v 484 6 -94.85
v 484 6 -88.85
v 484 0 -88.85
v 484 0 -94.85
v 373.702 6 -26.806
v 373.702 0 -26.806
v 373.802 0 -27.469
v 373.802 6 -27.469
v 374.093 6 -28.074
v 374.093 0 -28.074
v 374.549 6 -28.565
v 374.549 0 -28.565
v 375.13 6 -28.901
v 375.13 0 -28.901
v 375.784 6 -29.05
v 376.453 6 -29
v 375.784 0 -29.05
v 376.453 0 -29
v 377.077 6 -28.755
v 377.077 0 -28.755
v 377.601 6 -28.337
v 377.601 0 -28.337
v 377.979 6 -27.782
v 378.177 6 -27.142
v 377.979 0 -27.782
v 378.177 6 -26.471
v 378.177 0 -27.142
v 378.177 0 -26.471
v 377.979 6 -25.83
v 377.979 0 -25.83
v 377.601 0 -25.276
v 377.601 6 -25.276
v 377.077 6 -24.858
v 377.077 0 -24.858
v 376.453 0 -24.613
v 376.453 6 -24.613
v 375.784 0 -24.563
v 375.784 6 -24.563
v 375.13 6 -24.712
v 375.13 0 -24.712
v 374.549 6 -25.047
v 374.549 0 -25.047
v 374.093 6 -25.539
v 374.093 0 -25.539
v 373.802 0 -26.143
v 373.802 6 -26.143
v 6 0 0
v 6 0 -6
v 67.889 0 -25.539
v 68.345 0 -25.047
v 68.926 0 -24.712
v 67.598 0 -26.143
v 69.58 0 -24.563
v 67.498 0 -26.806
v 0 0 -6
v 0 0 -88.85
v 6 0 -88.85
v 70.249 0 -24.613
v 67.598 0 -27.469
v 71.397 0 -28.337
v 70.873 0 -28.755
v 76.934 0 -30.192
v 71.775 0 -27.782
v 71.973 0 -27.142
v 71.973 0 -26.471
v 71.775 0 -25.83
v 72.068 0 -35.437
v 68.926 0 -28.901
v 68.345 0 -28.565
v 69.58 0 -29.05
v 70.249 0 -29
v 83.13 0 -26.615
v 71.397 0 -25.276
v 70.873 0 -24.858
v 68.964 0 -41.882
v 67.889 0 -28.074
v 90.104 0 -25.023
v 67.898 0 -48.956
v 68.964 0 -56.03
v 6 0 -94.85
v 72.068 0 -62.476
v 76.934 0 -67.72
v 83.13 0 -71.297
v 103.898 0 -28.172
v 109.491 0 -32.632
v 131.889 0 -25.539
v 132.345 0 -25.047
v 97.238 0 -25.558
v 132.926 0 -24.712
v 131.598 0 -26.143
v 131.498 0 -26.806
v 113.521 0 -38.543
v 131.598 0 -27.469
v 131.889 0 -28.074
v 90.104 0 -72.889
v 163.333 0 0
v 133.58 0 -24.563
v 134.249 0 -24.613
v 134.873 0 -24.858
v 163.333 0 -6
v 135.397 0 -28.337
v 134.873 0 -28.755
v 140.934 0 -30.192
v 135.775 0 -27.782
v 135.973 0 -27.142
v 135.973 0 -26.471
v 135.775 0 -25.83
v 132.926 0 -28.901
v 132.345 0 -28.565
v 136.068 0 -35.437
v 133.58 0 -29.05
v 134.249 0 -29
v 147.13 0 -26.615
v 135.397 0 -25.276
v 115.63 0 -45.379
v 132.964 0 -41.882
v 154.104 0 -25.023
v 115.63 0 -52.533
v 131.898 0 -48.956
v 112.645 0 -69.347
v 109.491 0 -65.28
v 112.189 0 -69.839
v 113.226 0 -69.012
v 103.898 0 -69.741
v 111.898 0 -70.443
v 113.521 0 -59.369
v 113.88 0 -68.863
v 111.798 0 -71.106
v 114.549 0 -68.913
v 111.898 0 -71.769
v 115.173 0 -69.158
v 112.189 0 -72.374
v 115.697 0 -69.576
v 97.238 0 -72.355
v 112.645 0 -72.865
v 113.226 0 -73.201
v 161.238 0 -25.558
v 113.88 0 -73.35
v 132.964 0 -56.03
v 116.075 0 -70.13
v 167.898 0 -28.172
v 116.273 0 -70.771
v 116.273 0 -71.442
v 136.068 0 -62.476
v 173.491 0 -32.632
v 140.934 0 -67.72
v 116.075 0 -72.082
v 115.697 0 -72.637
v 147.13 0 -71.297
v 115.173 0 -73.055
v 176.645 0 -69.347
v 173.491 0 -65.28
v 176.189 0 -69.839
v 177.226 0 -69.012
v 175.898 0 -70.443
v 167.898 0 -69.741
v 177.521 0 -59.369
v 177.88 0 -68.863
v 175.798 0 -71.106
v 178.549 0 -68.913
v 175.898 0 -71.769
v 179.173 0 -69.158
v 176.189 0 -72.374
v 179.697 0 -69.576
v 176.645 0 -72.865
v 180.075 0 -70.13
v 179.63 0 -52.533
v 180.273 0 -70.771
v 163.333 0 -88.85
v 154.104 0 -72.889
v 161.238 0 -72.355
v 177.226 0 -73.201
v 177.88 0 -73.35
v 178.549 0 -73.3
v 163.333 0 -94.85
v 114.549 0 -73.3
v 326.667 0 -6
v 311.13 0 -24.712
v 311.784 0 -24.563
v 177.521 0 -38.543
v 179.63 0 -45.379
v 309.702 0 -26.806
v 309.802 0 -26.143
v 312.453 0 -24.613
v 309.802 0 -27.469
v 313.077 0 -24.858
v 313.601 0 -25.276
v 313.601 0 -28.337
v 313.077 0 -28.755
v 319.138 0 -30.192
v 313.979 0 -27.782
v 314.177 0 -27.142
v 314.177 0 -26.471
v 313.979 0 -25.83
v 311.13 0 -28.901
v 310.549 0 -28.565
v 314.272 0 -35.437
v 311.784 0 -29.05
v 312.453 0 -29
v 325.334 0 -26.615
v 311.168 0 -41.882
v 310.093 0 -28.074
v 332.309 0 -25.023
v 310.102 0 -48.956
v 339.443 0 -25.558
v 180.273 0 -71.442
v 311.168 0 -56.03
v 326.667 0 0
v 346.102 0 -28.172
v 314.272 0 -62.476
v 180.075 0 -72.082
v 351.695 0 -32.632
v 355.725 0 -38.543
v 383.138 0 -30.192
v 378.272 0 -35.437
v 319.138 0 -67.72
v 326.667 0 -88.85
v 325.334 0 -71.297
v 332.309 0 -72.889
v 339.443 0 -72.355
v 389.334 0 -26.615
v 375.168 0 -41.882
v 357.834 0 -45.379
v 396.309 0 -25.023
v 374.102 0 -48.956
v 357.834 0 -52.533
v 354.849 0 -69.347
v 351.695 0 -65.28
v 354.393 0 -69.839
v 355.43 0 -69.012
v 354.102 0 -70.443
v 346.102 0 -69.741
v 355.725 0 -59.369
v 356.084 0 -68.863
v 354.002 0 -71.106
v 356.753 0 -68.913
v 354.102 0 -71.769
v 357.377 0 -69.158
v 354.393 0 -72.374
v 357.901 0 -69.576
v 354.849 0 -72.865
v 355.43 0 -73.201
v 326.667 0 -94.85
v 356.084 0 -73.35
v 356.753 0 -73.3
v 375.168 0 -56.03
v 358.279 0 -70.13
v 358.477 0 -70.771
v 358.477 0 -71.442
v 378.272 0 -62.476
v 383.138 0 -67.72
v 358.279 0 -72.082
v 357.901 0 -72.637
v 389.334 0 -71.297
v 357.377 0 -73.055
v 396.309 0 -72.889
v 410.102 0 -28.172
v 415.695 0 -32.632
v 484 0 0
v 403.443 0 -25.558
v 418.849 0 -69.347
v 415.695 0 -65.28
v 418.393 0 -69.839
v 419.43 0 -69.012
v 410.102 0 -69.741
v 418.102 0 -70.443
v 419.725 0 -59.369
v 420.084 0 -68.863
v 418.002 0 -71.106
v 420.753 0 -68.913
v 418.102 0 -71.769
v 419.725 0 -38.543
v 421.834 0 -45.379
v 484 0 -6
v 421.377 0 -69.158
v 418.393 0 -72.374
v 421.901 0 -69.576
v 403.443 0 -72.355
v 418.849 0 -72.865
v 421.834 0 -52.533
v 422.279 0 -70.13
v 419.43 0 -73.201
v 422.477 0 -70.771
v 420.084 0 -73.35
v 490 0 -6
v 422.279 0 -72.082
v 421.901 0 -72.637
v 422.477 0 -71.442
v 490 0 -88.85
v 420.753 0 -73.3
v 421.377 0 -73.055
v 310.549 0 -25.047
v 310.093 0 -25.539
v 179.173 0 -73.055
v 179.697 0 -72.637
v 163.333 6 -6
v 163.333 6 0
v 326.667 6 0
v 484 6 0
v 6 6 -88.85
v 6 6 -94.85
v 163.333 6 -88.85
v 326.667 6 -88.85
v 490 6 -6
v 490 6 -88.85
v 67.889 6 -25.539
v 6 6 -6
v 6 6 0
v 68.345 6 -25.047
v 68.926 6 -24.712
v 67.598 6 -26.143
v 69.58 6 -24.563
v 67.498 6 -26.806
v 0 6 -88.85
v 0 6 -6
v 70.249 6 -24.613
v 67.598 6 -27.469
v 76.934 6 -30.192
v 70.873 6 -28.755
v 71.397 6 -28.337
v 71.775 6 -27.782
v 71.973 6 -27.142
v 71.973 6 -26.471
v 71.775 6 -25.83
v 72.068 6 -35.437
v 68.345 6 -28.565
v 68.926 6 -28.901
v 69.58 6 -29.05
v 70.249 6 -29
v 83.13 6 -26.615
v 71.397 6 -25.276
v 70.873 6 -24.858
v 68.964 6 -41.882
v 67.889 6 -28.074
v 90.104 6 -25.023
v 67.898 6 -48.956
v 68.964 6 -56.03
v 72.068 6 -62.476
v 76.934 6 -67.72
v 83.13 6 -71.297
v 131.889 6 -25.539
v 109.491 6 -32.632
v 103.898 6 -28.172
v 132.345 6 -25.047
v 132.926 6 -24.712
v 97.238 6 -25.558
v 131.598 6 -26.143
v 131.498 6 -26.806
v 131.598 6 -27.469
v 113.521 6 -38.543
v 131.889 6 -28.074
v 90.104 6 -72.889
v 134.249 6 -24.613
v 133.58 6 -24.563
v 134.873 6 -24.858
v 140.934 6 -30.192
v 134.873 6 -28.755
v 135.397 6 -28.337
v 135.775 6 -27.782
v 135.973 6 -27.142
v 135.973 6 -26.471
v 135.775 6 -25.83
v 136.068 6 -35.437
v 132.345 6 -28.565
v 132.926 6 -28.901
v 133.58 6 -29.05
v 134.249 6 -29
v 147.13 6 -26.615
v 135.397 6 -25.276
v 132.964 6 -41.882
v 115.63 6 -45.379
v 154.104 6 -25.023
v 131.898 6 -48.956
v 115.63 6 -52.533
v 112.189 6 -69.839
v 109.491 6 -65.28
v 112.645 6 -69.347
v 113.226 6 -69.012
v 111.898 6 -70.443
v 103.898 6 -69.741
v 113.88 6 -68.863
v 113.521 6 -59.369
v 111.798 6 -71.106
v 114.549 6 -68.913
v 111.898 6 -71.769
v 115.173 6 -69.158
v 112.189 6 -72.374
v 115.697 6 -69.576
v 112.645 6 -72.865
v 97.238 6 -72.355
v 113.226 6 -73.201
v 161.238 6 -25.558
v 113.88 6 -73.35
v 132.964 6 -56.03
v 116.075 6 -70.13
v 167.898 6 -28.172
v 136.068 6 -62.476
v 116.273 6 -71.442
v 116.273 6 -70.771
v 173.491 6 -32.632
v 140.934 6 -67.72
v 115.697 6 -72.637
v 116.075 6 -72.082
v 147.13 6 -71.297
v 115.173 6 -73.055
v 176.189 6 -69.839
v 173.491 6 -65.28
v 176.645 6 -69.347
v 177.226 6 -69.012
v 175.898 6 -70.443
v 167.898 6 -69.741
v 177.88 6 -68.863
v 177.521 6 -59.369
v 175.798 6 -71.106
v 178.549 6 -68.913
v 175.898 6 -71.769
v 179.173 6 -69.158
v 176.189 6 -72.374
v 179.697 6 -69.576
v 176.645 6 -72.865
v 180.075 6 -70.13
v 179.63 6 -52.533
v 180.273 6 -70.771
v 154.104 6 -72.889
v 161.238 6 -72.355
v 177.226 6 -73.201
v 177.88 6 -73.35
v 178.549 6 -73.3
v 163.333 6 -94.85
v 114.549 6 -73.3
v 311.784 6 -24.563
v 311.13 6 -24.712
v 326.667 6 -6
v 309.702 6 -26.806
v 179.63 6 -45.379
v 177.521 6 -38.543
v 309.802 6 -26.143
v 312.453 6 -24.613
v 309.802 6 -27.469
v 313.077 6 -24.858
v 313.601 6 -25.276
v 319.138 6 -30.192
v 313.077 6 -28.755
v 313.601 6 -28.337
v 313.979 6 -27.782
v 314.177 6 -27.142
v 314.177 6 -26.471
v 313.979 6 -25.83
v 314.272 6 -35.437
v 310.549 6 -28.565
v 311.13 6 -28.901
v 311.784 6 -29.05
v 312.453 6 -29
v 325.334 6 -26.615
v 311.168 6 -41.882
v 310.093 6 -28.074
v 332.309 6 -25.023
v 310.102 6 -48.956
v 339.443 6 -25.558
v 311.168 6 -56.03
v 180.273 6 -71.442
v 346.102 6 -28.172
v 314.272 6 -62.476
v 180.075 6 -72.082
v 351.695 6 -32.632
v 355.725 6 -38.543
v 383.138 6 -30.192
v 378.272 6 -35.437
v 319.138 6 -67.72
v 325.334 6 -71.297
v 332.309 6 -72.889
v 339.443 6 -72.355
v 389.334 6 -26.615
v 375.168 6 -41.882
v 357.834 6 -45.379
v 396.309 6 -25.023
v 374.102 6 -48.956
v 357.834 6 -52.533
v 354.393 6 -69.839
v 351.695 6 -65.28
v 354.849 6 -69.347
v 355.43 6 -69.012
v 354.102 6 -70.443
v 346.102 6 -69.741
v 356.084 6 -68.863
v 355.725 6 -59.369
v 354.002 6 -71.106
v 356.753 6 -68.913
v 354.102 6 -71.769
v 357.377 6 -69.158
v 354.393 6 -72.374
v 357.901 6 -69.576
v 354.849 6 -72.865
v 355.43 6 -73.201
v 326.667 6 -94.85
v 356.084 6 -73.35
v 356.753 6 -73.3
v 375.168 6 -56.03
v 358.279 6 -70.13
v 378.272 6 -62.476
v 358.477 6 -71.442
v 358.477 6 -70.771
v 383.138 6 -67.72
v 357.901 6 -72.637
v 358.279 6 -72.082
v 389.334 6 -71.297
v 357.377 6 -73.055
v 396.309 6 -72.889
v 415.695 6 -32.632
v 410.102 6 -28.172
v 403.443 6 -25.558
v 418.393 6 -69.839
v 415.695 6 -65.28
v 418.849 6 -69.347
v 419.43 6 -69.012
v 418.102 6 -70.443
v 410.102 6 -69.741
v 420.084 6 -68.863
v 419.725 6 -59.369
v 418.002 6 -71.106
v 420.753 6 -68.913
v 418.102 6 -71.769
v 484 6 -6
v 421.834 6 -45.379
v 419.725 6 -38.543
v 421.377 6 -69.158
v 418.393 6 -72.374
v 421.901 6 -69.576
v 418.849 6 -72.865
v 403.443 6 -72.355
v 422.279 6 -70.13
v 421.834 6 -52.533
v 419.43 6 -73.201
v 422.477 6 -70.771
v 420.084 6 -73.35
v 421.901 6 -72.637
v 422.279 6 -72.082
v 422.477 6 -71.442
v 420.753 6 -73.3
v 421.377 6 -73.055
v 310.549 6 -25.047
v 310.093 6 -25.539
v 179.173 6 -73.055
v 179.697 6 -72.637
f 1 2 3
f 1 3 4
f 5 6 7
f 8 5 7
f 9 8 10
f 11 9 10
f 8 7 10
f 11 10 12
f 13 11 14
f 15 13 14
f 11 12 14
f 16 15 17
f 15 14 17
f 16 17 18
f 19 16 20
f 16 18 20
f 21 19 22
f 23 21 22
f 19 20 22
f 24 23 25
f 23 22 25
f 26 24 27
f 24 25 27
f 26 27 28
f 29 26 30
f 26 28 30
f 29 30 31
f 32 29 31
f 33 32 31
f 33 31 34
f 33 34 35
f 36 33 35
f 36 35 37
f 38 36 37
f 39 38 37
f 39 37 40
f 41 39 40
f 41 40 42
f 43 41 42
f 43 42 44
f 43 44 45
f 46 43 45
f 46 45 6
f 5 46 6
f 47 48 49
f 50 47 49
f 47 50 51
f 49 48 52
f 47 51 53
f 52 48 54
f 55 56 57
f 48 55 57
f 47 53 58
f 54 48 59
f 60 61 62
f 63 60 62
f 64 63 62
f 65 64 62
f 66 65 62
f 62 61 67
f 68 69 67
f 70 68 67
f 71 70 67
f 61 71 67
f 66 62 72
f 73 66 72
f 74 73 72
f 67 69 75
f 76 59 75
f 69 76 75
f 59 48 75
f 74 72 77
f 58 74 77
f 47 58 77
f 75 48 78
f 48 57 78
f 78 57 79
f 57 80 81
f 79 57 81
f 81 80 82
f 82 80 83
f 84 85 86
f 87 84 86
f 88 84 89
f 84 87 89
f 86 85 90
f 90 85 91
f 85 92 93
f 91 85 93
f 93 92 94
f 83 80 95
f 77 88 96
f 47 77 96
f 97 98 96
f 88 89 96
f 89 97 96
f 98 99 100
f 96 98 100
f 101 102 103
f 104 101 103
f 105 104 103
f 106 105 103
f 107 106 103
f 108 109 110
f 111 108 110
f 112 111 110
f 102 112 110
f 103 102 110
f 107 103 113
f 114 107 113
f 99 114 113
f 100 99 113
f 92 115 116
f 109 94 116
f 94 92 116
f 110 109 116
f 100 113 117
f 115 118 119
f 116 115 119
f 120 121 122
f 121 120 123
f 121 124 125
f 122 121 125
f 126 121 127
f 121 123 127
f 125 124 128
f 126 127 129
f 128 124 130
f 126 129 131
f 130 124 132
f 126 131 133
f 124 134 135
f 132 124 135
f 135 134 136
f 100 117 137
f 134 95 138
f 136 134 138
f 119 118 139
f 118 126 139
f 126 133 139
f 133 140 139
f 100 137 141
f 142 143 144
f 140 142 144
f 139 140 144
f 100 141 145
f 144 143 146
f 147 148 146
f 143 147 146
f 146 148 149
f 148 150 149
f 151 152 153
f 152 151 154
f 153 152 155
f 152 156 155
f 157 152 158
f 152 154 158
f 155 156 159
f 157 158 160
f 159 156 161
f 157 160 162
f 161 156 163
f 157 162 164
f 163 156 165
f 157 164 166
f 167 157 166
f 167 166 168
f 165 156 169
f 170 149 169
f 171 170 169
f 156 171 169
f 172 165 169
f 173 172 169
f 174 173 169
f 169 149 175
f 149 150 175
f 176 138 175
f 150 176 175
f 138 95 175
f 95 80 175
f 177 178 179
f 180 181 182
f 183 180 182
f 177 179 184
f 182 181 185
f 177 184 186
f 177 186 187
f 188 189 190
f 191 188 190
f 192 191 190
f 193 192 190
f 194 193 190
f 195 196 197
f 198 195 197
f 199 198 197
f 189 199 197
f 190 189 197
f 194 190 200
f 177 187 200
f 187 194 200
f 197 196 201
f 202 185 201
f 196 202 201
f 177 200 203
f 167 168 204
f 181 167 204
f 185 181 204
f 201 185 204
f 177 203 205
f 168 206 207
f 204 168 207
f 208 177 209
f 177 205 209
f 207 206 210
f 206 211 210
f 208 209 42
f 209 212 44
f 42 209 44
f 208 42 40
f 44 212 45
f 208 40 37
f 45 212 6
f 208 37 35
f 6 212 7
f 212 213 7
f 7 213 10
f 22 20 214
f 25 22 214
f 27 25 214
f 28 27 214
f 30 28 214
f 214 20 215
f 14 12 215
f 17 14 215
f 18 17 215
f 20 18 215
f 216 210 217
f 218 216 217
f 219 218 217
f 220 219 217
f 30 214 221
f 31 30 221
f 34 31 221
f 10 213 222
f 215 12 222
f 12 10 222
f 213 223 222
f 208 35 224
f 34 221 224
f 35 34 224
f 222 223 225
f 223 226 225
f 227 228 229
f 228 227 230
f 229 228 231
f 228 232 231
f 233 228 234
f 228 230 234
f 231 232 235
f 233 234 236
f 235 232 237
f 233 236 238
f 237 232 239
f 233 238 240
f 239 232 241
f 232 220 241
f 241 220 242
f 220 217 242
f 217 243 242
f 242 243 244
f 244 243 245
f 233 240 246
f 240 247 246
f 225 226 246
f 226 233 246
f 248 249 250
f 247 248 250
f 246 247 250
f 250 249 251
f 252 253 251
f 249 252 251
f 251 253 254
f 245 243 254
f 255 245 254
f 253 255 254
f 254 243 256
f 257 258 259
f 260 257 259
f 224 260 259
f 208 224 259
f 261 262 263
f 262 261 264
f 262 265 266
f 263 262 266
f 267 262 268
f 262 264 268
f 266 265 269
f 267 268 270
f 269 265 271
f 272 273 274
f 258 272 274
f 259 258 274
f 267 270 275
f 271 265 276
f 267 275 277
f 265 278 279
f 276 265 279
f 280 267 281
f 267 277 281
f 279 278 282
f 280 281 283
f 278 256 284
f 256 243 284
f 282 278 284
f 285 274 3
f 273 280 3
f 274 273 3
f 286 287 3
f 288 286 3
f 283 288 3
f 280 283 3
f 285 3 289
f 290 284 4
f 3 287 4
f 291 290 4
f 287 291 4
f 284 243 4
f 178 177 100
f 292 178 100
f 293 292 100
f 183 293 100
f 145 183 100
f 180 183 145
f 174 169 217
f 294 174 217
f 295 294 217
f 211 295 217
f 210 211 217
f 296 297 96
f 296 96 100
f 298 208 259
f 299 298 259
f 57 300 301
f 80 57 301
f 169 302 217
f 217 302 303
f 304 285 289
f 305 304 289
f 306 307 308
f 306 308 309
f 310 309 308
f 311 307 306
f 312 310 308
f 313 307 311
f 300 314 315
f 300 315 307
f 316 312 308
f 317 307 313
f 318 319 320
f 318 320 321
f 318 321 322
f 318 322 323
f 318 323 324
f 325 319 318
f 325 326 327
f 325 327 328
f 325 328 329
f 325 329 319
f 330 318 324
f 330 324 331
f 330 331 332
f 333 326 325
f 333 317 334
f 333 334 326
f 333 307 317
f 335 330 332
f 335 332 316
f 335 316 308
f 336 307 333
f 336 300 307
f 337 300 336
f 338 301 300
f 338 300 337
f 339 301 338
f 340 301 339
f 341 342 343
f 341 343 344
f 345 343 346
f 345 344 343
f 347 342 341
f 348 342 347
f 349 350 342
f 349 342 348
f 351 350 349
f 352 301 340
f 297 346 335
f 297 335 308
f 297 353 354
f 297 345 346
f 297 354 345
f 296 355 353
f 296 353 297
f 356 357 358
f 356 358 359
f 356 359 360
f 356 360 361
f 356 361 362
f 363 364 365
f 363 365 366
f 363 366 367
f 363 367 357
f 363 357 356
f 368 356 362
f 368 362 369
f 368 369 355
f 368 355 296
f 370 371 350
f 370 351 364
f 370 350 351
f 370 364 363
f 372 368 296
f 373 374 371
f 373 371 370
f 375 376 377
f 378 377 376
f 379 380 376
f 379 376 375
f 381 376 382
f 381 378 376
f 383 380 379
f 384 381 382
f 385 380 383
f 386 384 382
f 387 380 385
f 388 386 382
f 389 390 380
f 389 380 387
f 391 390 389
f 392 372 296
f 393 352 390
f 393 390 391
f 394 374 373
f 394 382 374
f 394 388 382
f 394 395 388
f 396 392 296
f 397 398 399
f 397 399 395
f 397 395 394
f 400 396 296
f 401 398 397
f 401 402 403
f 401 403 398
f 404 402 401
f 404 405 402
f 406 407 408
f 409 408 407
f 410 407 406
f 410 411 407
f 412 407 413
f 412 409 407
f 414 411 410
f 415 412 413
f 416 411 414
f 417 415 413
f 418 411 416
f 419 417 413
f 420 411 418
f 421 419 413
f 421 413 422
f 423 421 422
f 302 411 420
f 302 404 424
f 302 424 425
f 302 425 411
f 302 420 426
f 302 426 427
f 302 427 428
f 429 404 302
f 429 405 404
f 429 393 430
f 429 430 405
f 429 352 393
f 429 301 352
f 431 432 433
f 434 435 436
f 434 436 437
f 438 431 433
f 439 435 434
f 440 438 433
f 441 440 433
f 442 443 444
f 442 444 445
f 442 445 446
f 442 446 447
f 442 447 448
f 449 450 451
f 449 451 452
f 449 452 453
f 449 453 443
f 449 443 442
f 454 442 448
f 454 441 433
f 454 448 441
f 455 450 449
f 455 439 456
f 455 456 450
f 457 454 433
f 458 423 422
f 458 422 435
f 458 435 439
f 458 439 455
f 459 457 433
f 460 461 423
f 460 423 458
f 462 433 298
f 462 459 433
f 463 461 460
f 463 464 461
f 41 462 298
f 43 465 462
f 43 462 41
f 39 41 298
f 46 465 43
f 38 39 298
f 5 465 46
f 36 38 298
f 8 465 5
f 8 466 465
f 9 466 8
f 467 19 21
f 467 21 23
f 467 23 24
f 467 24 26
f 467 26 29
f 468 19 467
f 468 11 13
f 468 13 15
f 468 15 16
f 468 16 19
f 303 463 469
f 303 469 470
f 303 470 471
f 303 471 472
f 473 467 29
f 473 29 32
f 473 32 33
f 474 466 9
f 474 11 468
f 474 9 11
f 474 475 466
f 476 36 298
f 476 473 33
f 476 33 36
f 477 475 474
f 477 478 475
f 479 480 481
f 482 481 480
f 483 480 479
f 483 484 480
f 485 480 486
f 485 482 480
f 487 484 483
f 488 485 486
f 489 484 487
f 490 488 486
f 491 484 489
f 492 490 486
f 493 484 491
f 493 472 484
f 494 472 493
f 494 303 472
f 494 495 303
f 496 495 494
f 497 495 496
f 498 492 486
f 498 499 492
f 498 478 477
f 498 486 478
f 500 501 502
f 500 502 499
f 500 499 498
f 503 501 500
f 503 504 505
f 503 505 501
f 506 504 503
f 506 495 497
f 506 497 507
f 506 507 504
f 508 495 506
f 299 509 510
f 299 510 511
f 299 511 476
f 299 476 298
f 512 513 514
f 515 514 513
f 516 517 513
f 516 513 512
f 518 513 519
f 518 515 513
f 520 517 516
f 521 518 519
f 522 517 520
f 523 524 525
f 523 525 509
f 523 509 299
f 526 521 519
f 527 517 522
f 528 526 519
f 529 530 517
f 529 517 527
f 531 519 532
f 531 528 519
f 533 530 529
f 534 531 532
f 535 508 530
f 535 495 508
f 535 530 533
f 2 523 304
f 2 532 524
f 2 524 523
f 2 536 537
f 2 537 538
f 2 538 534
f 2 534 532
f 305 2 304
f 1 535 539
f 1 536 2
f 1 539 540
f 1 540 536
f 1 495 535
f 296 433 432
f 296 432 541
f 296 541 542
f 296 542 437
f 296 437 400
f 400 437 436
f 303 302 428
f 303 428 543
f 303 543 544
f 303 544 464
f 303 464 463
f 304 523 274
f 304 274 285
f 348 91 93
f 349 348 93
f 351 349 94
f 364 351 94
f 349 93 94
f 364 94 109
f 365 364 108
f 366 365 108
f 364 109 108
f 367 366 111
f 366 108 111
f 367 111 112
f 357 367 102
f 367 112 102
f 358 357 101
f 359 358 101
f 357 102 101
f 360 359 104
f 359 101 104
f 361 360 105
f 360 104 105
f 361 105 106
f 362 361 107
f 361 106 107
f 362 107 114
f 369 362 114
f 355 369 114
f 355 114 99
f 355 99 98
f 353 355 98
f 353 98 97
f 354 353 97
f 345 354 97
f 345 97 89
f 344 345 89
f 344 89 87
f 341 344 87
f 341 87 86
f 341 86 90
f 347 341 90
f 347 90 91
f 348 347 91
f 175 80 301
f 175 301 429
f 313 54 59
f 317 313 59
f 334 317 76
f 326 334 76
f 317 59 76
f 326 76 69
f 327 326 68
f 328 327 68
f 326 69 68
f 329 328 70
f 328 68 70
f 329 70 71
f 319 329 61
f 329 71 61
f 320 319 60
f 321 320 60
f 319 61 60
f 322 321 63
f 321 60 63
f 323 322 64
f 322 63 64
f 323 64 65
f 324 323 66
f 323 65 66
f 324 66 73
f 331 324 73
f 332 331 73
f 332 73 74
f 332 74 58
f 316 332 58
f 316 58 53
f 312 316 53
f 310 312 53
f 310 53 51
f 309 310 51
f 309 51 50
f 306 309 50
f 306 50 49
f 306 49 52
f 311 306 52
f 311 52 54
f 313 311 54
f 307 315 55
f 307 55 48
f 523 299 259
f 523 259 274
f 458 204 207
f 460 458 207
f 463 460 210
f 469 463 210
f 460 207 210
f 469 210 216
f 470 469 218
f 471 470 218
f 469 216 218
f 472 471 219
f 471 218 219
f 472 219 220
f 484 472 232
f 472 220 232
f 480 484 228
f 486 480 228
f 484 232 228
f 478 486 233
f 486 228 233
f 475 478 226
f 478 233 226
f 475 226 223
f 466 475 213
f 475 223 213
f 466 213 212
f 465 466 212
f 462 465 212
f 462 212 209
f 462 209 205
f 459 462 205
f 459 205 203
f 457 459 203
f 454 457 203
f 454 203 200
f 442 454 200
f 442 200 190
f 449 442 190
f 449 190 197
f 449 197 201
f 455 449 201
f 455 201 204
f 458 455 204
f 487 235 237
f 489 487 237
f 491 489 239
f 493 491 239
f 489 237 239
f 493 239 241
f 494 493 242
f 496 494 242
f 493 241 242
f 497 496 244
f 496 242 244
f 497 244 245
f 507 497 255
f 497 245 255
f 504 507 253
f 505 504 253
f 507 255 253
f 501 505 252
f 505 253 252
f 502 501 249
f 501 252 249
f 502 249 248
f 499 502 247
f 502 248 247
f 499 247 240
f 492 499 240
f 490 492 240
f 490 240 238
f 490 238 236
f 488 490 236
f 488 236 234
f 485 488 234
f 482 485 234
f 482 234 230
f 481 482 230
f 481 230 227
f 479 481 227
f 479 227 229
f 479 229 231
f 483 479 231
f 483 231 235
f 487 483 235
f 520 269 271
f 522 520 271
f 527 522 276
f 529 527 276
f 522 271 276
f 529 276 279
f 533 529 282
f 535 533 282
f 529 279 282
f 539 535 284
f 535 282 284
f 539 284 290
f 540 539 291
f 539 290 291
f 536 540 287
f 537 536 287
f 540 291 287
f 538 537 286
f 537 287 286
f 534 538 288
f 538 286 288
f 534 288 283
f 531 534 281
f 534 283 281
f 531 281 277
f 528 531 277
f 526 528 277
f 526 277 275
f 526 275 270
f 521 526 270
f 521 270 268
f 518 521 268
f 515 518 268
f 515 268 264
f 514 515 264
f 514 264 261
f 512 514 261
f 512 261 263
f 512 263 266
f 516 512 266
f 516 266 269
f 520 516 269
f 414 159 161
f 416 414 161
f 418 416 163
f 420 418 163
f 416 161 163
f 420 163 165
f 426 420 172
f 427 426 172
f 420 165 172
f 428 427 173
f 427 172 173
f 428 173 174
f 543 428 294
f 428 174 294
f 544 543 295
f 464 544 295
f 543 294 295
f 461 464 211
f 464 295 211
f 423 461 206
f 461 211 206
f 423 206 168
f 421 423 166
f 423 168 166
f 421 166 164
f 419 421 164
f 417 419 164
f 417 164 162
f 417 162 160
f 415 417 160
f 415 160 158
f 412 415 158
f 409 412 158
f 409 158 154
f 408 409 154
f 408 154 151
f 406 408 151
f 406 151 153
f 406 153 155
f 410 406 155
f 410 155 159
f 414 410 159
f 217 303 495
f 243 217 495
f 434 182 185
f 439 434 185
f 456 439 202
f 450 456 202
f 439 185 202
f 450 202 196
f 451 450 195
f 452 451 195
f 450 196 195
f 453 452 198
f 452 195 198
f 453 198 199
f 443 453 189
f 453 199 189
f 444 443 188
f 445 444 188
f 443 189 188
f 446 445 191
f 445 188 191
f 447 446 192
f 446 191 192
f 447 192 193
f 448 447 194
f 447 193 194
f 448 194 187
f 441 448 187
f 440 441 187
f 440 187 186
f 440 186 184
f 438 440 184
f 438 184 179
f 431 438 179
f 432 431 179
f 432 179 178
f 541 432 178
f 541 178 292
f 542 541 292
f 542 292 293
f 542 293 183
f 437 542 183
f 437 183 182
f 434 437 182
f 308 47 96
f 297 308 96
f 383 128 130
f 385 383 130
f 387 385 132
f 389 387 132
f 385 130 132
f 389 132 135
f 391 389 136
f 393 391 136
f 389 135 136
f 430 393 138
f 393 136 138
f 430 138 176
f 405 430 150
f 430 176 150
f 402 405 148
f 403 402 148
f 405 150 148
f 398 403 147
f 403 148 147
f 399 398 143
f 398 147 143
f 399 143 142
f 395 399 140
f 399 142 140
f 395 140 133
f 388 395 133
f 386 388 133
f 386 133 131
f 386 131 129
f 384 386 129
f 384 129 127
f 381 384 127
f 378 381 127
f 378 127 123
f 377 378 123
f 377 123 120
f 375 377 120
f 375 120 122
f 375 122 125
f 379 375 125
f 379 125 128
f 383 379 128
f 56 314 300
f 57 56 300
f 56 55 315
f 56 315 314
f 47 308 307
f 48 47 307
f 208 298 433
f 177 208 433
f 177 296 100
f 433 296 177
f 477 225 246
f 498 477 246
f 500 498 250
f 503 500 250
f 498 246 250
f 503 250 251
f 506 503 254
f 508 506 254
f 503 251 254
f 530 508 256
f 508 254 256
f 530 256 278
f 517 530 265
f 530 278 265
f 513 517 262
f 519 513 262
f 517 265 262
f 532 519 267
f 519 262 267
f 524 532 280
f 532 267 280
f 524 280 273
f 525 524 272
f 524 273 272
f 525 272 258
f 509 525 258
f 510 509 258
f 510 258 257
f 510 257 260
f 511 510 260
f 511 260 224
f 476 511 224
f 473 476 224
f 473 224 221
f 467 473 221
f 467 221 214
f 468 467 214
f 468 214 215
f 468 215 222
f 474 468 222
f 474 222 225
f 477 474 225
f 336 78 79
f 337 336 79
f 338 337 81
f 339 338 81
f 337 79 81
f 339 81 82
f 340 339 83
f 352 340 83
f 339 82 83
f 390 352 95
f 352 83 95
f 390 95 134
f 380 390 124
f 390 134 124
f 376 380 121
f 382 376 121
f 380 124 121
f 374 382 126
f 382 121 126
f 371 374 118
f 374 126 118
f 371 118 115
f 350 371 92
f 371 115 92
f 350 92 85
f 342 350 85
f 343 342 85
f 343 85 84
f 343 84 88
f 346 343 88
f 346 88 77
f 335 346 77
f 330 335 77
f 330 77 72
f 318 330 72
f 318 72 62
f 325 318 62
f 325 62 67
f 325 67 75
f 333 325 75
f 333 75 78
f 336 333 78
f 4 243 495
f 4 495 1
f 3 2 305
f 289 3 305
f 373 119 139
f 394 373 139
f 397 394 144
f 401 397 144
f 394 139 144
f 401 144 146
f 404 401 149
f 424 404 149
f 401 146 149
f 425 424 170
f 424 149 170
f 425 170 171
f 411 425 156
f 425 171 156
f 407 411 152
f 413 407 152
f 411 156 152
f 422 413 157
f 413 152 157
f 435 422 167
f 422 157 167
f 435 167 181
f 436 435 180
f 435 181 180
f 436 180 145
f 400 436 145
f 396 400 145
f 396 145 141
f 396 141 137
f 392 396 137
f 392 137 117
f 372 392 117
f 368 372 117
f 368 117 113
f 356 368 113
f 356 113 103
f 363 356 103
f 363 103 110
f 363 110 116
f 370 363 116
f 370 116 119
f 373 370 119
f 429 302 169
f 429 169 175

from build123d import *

# Parameters (mm, degrees)
SKETCH2_W                 = 490
SKETCH2_H                 = 94.85
BOSS_EXTRUDE1_DEPTH       = 6
SKETCH4_W                 = 6
SKETCH4_H                 = 6
CUT_EXTRUDE2_DEPTH        = 500.131768674
SKETCH5_W                 = 163.333333334
SKETCH5_H                 = 6
CUT_EXTRUDE3_DEPTH        = 500.131768674
M4_CLEARANCE_SLOT1_D      = 4.5
M4_CLEARANCE_SLOT1_DEPTH  = 18
M4_CLEARANCE_SLOT1_TIP    = 1.351936393
M45_CLEARANCE_SLOT1_D     = 48
M45_CLEARANCE_SLOT1_DEPTH = 18
M45_CLEARANCE_SLOT1_TIP   = 14.420654857


with BuildPart() as part:
    # Sketch2 → Boss-Extrude1 (new body)
    with BuildSketch(Plane(origin=(0, 0, 0), x_dir=(1, 0, 0), z_dir=(0, 1, 0))):
        with Locations((245, 47.425)):
            Rectangle(SKETCH2_W, SKETCH2_H)
    extrude(amount=BOSS_EXTRUDE1_DEPTH)

    # Sketch4 → Cut-Extrude2 (cut, through all)
    with BuildSketch(Plane(origin=(0, 6, 0), x_dir=(1, 0, 0), z_dir=(0, 1, 0))):
        with Locations((487, 3)):
            Rectangle(SKETCH4_W, SKETCH4_H)
        with Locations((487, 91.85)):
            Rectangle(SKETCH4_W, SKETCH4_H)
        with Locations((3, 91.85)):
            Rectangle(SKETCH4_W, SKETCH4_H)
        with Locations((3, 3)):
            Rectangle(SKETCH4_W, SKETCH4_H)
    extrude(amount=-CUT_EXTRUDE2_DEPTH, mode=Mode.SUBTRACT)

    # Sketch5 → Cut-Extrude3 (cut, through all)
    with BuildSketch(Plane(origin=(0, 6, 0), x_dir=(1, 0, 0), z_dir=(0, 1, 0))):
        with Locations((245, 91.85)):
            Rectangle(SKETCH5_W, SKETCH5_H)
        with Locations((245, 3)):
            Rectangle(SKETCH5_W, SKETCH5_H)
    extrude(amount=-CUT_EXTRUDE3_DEPTH, mode=Mode.SUBTRACT)

    # M4 Clearance Slot1
    with Locations(Plane(origin=(0, 6, 0), x_dir=(1, 0, 0), z_dir=(0, 1, 0))):
        with Locations((375.95208337, 26.806250977), (420.25208337, 71.106250977), (356.25208337, 71.106250977), (311.95208337, 26.806250977), (178.04791663, 71.106250977), (133.74791663, 26.806250977), (114.04791663, 71.106250977), (69.74791663, 26.806250977)):
            Hole(M4_CLEARANCE_SLOT1_D / 2, depth=M4_CLEARANCE_SLOT1_DEPTH)
            with Locations((0, 0, -(M4_CLEARANCE_SLOT1_DEPTH + M4_CLEARANCE_SLOT1_TIP / 2))):  # 118° drill point
                Cone(0, M4_CLEARANCE_SLOT1_D / 2, M4_CLEARANCE_SLOT1_TIP, mode=Mode.SUBTRACT)

    # M45 Clearance Slot1
    with Locations(Plane(origin=(0, 6, 0), x_dir=(1, 0, 0), z_dir=(0, 1, 0))):
        with Locations((91.89791663, 48.956250977), (155.89791663, 48.956250977), (334.10208337, 48.956250977), (398.10208337, 48.956250977)):
            Hole(M45_CLEARANCE_SLOT1_D / 2, depth=M45_CLEARANCE_SLOT1_DEPTH)
            with Locations((0, 0, -(M45_CLEARANCE_SLOT1_DEPTH + M45_CLEARANCE_SLOT1_TIP / 2))):  # 118° drill point
                Cone(0, M45_CLEARANCE_SLOT1_D / 2, M45_CLEARANCE_SLOT1_TIP, mode=Mode.SUBTRACT)


solid = part.part
